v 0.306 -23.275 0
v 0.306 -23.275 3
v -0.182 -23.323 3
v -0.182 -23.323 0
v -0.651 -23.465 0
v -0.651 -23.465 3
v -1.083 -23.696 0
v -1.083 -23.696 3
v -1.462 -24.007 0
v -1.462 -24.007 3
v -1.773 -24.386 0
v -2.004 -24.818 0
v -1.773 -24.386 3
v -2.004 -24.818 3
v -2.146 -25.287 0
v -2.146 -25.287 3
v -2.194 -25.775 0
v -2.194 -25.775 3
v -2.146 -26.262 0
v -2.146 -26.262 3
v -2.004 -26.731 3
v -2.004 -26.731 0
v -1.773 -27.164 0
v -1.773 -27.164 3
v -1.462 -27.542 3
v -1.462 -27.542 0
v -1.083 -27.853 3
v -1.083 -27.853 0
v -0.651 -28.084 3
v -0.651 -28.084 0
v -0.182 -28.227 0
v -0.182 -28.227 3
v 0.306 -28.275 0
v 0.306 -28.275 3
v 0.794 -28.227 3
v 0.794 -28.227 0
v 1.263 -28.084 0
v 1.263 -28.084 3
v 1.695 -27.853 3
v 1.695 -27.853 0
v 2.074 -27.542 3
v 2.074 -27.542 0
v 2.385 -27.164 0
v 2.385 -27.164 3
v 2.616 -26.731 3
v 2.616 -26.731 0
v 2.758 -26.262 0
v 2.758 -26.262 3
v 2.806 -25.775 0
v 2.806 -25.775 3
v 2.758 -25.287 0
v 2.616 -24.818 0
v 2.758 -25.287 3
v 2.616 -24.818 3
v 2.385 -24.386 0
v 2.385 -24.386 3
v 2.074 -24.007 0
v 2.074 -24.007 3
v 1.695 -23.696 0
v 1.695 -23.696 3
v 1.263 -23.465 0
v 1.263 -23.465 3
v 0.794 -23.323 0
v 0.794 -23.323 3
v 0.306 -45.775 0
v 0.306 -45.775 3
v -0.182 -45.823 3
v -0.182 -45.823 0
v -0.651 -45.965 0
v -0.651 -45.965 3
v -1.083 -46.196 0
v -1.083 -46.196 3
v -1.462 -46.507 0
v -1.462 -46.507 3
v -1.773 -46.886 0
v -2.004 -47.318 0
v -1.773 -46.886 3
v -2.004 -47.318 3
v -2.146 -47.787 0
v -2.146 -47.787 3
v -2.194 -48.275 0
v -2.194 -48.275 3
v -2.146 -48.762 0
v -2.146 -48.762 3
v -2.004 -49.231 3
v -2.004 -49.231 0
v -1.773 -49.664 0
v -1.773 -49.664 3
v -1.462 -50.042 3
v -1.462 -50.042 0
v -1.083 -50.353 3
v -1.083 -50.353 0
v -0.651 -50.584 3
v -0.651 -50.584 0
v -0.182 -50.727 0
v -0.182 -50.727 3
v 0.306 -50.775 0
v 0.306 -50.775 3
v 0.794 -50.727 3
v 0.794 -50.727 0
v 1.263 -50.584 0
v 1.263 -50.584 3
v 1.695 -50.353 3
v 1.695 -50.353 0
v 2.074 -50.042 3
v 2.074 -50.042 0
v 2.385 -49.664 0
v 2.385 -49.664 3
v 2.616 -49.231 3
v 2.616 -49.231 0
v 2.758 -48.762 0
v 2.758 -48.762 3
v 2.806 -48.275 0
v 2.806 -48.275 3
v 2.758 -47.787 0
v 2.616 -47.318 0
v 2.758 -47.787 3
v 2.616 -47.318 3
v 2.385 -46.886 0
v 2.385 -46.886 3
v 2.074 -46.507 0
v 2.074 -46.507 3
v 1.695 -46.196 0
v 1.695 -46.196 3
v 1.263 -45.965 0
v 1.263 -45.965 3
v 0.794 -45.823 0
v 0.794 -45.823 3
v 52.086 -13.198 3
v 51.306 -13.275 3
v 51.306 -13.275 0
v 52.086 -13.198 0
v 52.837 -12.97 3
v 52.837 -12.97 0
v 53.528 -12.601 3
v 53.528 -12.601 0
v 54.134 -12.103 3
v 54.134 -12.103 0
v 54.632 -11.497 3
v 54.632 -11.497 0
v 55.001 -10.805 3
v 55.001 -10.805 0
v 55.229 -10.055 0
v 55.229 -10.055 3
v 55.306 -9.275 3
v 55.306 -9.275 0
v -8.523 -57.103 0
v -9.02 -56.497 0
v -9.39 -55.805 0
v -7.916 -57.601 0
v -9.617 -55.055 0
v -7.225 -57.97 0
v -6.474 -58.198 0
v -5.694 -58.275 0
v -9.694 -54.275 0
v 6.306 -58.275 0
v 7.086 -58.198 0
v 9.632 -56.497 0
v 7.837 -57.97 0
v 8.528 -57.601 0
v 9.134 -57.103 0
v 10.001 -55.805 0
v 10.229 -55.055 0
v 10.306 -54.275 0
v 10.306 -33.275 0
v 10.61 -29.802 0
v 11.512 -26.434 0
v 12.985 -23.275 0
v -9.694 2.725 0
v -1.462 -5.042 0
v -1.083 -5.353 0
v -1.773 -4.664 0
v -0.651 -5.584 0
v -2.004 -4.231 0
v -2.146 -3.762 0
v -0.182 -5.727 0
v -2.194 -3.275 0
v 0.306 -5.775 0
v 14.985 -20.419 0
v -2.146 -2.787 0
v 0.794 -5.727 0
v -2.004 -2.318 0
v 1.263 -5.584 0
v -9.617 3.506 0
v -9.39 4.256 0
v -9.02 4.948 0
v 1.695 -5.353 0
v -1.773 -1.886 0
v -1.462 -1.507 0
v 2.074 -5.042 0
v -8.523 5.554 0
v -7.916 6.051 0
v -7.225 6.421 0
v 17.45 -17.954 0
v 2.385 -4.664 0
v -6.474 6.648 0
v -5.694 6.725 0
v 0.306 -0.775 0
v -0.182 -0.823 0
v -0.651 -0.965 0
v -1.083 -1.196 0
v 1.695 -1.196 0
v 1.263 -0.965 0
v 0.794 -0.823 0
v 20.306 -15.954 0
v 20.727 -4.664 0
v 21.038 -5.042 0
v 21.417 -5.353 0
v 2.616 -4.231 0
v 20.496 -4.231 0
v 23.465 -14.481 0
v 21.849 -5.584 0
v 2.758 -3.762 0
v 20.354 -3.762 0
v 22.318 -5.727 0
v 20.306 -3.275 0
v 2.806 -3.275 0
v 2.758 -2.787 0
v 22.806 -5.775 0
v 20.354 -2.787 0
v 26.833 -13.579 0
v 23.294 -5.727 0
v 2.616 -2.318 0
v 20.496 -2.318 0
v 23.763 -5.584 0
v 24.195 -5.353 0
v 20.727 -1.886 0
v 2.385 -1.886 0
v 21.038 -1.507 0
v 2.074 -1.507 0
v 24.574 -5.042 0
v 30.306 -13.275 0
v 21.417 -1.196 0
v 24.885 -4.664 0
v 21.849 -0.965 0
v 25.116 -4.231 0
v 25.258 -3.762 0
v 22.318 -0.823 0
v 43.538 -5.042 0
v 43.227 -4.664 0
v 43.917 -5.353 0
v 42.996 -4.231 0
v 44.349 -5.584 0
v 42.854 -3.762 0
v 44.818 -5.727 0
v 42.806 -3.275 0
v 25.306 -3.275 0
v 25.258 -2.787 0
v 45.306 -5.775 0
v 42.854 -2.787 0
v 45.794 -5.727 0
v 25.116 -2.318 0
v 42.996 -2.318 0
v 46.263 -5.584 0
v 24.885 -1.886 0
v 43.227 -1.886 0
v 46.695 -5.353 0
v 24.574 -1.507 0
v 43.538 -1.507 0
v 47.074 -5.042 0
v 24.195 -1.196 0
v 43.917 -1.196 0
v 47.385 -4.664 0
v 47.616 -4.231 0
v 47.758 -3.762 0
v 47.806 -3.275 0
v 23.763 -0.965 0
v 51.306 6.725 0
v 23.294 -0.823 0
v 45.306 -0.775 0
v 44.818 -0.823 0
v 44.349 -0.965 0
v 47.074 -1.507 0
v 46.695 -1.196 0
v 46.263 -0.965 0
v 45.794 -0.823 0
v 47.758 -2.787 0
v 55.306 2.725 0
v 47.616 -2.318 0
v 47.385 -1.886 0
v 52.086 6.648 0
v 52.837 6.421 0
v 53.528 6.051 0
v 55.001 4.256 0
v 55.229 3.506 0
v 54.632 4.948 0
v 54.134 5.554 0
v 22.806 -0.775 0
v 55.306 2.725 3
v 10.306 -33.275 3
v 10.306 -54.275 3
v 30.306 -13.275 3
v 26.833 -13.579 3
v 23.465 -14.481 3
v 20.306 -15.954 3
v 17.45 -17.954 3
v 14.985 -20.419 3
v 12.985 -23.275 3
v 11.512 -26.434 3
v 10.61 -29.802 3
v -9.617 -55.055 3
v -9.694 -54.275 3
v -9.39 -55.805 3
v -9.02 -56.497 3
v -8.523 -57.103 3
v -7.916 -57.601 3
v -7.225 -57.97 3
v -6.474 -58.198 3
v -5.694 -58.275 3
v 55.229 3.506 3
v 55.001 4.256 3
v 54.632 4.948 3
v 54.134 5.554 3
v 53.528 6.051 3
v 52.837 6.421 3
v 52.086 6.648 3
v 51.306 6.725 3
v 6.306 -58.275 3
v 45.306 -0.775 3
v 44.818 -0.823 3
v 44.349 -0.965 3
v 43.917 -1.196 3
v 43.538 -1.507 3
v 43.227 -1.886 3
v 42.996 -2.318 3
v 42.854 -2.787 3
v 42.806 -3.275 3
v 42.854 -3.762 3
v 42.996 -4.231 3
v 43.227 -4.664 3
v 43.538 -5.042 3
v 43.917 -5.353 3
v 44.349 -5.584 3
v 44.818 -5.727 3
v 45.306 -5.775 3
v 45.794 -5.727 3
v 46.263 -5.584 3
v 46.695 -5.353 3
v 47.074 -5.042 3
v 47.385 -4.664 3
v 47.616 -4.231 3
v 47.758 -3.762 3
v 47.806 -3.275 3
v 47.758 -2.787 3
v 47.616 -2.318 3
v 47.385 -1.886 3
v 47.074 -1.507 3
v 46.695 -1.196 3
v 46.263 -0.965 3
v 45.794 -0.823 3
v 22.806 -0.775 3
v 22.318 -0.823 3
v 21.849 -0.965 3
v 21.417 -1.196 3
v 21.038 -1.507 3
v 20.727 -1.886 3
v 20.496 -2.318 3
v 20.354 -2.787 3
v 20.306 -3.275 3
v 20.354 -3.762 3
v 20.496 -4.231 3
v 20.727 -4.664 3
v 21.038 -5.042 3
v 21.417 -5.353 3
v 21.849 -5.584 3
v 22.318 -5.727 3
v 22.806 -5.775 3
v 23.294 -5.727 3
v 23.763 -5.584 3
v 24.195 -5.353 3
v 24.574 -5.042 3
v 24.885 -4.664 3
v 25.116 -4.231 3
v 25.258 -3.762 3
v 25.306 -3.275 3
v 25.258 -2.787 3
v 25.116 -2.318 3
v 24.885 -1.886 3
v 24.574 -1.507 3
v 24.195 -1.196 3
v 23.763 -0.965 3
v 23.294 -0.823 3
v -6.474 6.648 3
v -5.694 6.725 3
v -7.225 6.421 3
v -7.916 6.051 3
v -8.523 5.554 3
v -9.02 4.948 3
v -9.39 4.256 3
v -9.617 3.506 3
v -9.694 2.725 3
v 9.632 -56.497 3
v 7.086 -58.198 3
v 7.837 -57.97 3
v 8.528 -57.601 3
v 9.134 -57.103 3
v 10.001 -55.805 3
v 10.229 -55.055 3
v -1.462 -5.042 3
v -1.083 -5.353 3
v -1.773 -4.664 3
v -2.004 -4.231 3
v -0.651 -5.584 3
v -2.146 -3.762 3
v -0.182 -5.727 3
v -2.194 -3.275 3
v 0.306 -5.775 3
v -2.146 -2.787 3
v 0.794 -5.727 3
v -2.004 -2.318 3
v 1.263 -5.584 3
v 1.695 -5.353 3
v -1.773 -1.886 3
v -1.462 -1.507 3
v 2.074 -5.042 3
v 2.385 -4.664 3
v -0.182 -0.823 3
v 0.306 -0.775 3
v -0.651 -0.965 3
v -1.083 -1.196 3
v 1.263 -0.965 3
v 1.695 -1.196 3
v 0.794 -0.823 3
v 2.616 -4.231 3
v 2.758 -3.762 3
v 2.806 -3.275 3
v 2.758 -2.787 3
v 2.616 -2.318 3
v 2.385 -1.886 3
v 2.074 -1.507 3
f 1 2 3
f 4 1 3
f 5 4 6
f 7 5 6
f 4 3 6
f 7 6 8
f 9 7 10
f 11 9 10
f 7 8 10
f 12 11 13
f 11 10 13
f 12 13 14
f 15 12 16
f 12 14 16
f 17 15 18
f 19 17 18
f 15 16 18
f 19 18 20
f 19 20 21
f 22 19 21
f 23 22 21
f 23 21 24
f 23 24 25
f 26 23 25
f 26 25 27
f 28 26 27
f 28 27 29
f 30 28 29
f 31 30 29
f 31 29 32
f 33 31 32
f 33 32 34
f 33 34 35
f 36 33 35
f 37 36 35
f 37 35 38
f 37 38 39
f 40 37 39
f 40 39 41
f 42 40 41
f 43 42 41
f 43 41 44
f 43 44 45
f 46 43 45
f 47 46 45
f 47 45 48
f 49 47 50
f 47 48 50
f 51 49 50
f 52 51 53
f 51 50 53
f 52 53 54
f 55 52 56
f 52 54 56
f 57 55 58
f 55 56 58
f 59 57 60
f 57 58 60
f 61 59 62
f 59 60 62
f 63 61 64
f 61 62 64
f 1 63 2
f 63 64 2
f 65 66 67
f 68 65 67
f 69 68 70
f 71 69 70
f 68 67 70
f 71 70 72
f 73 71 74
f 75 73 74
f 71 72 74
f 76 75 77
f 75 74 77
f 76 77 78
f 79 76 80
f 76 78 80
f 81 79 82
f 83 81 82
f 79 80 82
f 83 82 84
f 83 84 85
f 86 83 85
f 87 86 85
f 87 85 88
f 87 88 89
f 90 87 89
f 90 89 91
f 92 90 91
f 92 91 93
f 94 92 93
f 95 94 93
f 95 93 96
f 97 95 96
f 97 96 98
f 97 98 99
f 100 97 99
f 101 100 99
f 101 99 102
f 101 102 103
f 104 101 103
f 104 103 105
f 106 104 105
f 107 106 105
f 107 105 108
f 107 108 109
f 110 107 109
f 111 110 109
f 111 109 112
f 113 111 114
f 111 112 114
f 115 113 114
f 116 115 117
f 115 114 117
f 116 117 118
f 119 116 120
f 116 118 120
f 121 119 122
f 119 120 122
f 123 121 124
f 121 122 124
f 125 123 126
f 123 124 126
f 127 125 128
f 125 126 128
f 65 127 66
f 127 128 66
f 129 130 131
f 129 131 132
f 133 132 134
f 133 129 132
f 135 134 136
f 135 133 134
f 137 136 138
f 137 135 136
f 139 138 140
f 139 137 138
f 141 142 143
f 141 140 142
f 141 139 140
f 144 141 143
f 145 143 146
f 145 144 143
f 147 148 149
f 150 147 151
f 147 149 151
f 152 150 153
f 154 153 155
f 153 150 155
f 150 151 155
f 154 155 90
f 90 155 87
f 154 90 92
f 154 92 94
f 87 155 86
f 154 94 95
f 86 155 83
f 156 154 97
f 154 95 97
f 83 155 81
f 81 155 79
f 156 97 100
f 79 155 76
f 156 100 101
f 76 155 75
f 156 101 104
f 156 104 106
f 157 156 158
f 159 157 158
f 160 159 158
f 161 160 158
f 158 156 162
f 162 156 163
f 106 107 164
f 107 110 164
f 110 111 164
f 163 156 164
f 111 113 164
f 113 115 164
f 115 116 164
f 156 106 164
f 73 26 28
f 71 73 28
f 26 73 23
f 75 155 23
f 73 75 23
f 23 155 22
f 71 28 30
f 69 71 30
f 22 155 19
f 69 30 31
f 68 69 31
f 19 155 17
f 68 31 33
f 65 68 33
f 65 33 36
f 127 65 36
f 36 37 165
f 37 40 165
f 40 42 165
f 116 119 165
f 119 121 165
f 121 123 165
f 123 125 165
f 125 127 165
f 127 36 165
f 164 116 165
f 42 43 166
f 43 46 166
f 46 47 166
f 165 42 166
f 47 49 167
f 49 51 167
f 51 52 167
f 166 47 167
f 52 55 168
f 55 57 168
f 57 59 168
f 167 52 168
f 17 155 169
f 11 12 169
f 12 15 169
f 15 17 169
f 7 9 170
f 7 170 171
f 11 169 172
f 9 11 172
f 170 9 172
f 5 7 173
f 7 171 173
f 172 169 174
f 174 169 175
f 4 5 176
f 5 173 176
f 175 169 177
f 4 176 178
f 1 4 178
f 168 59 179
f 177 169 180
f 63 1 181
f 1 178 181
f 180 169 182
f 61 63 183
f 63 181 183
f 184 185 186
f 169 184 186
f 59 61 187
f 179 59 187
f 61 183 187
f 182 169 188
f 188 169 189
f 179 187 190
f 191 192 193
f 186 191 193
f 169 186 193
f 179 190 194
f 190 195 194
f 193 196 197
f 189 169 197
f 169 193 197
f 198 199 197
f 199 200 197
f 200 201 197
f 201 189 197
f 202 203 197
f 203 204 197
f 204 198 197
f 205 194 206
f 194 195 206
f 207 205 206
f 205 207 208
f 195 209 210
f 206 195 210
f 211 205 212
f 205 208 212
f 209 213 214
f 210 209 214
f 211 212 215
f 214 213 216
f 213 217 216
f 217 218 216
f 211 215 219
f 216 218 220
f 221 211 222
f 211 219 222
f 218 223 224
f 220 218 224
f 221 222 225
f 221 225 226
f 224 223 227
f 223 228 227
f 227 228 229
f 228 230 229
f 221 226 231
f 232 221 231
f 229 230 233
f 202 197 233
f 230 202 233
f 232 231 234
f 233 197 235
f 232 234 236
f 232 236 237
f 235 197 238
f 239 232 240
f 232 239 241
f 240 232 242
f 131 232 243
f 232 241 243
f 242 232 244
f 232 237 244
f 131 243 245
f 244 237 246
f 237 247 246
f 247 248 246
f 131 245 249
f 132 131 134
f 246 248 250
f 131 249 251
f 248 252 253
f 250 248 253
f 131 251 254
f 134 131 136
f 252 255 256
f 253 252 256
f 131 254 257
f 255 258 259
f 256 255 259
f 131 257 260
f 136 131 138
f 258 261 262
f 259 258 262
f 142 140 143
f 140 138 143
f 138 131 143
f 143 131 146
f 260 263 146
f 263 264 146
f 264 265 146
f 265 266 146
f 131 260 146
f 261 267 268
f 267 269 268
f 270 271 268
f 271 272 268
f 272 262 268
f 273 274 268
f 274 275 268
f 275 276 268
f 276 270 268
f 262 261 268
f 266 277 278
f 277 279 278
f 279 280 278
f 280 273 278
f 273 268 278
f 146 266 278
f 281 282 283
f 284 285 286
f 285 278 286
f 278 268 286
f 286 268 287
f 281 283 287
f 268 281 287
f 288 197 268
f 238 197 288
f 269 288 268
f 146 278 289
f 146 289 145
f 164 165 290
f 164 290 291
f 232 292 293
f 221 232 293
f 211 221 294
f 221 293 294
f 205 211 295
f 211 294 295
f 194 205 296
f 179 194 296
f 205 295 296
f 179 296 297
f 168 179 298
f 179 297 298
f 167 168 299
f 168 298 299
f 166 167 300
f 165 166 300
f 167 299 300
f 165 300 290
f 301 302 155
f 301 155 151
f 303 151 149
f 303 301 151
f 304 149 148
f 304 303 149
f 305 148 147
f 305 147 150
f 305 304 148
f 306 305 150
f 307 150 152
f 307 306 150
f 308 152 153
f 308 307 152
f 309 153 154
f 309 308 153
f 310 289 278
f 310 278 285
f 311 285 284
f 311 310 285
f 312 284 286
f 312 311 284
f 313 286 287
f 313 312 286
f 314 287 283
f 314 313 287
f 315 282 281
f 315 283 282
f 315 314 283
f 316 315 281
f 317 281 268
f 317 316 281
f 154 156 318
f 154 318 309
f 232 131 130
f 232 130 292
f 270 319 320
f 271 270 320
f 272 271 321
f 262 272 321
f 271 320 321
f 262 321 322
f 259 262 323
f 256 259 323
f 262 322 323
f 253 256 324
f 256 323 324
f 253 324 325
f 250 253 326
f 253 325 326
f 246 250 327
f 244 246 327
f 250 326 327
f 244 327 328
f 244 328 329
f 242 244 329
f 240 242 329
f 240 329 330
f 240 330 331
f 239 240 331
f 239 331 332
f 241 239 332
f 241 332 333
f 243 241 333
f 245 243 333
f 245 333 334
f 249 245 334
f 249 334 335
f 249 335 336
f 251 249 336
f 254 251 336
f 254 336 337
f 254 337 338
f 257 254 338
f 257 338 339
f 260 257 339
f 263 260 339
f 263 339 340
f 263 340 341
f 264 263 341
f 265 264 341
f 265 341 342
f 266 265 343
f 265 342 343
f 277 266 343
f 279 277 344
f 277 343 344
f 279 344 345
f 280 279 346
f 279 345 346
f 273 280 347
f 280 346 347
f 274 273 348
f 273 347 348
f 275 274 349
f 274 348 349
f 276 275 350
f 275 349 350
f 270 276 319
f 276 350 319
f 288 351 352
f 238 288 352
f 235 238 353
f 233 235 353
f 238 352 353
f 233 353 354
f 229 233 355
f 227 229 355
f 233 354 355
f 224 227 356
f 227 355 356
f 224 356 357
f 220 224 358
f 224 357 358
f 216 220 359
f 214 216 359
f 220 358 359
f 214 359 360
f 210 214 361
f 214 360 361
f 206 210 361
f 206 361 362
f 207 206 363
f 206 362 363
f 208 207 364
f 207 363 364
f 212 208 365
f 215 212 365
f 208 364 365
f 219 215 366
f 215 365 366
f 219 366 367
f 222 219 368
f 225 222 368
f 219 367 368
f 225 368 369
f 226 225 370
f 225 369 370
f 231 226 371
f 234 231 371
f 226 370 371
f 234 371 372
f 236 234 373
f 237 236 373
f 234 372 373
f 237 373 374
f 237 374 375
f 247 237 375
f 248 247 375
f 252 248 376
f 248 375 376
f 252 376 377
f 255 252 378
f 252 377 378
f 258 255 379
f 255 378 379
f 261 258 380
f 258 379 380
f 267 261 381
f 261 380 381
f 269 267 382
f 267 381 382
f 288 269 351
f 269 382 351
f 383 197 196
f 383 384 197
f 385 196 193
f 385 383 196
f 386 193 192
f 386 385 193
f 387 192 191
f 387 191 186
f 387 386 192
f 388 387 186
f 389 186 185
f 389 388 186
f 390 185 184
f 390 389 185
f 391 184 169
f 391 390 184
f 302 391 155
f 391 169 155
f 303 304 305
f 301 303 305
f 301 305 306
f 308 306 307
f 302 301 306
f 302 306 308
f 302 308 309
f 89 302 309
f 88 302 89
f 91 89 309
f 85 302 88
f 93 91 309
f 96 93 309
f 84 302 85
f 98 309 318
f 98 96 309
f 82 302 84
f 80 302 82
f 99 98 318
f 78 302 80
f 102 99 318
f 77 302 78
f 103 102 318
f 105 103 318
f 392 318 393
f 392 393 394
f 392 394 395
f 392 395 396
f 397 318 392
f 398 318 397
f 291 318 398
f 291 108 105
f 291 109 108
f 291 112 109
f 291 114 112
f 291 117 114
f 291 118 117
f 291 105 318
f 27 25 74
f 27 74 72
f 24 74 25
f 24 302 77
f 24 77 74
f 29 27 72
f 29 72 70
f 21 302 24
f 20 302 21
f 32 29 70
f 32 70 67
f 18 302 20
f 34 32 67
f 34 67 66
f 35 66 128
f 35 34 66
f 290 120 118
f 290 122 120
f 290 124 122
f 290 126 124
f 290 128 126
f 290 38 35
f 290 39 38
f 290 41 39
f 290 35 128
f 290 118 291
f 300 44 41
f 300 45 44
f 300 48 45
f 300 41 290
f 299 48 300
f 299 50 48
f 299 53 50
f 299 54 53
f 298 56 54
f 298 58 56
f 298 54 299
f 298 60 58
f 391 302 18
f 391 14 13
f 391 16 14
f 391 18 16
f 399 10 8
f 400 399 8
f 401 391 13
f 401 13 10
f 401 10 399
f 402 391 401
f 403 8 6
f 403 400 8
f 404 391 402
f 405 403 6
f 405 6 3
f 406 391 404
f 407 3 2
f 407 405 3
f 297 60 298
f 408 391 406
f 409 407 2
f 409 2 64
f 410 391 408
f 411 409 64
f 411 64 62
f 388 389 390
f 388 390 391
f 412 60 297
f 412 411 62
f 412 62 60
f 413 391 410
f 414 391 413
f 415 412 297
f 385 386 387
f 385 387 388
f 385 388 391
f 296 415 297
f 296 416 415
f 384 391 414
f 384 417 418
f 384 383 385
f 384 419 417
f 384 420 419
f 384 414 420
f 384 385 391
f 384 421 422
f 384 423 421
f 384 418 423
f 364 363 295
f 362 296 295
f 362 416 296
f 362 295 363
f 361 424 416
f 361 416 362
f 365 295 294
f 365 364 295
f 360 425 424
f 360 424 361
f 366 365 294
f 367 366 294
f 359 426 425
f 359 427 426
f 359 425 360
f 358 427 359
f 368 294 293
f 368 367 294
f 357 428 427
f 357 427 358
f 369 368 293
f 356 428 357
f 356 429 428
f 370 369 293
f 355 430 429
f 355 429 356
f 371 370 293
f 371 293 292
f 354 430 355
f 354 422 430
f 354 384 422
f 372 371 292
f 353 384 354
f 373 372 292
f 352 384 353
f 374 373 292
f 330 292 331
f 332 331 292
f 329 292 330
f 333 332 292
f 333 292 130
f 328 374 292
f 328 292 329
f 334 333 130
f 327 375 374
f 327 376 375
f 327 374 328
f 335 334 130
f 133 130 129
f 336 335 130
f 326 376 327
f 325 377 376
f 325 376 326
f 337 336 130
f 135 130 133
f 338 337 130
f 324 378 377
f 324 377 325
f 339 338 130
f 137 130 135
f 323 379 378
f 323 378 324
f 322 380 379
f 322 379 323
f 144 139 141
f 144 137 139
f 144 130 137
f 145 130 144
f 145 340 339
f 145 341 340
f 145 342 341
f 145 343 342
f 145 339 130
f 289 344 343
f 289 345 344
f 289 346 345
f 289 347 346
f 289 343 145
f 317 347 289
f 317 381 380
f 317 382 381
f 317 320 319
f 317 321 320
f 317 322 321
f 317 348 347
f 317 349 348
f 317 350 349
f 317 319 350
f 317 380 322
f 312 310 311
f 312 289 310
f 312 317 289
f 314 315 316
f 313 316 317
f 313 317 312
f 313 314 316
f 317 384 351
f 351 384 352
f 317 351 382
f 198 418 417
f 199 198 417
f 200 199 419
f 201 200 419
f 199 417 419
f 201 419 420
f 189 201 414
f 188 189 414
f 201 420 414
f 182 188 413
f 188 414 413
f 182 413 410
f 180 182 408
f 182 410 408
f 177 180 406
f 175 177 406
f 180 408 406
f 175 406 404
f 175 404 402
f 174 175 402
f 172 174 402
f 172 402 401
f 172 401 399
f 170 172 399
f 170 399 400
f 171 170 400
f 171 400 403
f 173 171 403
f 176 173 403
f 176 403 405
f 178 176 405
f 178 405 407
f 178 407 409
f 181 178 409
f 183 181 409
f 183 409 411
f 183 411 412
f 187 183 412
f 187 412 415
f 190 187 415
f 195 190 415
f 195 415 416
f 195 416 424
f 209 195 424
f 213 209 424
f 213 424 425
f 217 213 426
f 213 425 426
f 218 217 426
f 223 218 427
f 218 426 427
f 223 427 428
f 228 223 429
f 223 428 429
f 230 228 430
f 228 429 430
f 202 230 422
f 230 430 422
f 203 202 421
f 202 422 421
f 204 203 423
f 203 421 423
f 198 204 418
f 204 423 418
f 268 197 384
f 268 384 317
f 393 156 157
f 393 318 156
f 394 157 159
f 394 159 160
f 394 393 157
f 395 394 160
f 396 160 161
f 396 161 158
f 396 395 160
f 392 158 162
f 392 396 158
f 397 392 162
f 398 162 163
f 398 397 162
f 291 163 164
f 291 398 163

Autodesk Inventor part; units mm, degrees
ref_plane "YZ Plane" through (0, 0, 0) normal (1, 0, 0) x (0, 1, 0)
ref_plane "XZ Plane" through (0, 0, 0) normal (0, 1, 0) x (-1, 0, 0)
ref_plane "XY Plane" through (0, 0, 0) normal (0, 0, 1) x (1, 0, 0)
sketch "Szkic1" plane through (0, 0, 0) normal (0, 0, 1) x (1, 0, 0)
  line L0 (-9.6941, 6.7253) -> (-9.6941, -58.2747)
  line L1 (-9.6941, 6.7253) -> (55.3059, 6.7253)
  line L2 (55.3059, 6.7253) -> (55.3059, -13.2747)
  line L3 (55.3059, -13.2747) -> (10.3059, -13.2747)
  line L4 (10.3059, -13.2747) -> (10.3059, -58.2747)
  line L5 (10.3059, -58.2747) -> (-9.6941, -58.2747)
  point P0 (0, 0)
  point P1 (0.3059, -48.2747)
  point P2 (0.3059, -25.7747)
  point P3 (0.3059, -3.2747)
  point P4 (45.3059, -3.2747)
  point P5 (22.8059, -3.2747)
  dimension "d0" = 65
  dimension "d1" = 65
  dimension "d2" = 20
  dimension "d4" = 10
  dimension "d5" = 10
  dimension "d6" = 20
  dimension "d7" = 10
  dimension "d8" = 10
  dimension "d9" = 10
  dimension "d10" = 22.5
  dimension "d11" = 22.5
  dimension "d12" = 10
  dimension "d13" = 10
  dimension "d14" = 10
extrude "Wyciągnięcie proste1" add sketch "Szkic1" along normal blind 3
hole "Otwór1" at (0.3059, -48.2747, 0) at (0.3059, -25.7747, 0) at (0.3059, -3.2747, 0) at (45.3059, -3.2747, 0) at (22.8059, -3.2747, 0) direction (0, 0, 1) diameter 5 end through all
fillet "Zaokrąglenie1" radius 4 5 edges at (-9.6941, 6.7253, 1.5) (55.3059, 6.7253, 1.5) (55.3059, -13.2747, 1.5) (10.3059, -58.2747, 1.5) (-9.6941, -58.2747, 1.5)
fillet "Zaokrąglenie2" radius 20 1 edges at (10.3059, -13.2747, 1.5)
equation "\"d11\" = d10"
properties part number "LC_ALU_3mm_Top_Beam_Mounting_Bracket" material "Aluminium 6061-AHC"
